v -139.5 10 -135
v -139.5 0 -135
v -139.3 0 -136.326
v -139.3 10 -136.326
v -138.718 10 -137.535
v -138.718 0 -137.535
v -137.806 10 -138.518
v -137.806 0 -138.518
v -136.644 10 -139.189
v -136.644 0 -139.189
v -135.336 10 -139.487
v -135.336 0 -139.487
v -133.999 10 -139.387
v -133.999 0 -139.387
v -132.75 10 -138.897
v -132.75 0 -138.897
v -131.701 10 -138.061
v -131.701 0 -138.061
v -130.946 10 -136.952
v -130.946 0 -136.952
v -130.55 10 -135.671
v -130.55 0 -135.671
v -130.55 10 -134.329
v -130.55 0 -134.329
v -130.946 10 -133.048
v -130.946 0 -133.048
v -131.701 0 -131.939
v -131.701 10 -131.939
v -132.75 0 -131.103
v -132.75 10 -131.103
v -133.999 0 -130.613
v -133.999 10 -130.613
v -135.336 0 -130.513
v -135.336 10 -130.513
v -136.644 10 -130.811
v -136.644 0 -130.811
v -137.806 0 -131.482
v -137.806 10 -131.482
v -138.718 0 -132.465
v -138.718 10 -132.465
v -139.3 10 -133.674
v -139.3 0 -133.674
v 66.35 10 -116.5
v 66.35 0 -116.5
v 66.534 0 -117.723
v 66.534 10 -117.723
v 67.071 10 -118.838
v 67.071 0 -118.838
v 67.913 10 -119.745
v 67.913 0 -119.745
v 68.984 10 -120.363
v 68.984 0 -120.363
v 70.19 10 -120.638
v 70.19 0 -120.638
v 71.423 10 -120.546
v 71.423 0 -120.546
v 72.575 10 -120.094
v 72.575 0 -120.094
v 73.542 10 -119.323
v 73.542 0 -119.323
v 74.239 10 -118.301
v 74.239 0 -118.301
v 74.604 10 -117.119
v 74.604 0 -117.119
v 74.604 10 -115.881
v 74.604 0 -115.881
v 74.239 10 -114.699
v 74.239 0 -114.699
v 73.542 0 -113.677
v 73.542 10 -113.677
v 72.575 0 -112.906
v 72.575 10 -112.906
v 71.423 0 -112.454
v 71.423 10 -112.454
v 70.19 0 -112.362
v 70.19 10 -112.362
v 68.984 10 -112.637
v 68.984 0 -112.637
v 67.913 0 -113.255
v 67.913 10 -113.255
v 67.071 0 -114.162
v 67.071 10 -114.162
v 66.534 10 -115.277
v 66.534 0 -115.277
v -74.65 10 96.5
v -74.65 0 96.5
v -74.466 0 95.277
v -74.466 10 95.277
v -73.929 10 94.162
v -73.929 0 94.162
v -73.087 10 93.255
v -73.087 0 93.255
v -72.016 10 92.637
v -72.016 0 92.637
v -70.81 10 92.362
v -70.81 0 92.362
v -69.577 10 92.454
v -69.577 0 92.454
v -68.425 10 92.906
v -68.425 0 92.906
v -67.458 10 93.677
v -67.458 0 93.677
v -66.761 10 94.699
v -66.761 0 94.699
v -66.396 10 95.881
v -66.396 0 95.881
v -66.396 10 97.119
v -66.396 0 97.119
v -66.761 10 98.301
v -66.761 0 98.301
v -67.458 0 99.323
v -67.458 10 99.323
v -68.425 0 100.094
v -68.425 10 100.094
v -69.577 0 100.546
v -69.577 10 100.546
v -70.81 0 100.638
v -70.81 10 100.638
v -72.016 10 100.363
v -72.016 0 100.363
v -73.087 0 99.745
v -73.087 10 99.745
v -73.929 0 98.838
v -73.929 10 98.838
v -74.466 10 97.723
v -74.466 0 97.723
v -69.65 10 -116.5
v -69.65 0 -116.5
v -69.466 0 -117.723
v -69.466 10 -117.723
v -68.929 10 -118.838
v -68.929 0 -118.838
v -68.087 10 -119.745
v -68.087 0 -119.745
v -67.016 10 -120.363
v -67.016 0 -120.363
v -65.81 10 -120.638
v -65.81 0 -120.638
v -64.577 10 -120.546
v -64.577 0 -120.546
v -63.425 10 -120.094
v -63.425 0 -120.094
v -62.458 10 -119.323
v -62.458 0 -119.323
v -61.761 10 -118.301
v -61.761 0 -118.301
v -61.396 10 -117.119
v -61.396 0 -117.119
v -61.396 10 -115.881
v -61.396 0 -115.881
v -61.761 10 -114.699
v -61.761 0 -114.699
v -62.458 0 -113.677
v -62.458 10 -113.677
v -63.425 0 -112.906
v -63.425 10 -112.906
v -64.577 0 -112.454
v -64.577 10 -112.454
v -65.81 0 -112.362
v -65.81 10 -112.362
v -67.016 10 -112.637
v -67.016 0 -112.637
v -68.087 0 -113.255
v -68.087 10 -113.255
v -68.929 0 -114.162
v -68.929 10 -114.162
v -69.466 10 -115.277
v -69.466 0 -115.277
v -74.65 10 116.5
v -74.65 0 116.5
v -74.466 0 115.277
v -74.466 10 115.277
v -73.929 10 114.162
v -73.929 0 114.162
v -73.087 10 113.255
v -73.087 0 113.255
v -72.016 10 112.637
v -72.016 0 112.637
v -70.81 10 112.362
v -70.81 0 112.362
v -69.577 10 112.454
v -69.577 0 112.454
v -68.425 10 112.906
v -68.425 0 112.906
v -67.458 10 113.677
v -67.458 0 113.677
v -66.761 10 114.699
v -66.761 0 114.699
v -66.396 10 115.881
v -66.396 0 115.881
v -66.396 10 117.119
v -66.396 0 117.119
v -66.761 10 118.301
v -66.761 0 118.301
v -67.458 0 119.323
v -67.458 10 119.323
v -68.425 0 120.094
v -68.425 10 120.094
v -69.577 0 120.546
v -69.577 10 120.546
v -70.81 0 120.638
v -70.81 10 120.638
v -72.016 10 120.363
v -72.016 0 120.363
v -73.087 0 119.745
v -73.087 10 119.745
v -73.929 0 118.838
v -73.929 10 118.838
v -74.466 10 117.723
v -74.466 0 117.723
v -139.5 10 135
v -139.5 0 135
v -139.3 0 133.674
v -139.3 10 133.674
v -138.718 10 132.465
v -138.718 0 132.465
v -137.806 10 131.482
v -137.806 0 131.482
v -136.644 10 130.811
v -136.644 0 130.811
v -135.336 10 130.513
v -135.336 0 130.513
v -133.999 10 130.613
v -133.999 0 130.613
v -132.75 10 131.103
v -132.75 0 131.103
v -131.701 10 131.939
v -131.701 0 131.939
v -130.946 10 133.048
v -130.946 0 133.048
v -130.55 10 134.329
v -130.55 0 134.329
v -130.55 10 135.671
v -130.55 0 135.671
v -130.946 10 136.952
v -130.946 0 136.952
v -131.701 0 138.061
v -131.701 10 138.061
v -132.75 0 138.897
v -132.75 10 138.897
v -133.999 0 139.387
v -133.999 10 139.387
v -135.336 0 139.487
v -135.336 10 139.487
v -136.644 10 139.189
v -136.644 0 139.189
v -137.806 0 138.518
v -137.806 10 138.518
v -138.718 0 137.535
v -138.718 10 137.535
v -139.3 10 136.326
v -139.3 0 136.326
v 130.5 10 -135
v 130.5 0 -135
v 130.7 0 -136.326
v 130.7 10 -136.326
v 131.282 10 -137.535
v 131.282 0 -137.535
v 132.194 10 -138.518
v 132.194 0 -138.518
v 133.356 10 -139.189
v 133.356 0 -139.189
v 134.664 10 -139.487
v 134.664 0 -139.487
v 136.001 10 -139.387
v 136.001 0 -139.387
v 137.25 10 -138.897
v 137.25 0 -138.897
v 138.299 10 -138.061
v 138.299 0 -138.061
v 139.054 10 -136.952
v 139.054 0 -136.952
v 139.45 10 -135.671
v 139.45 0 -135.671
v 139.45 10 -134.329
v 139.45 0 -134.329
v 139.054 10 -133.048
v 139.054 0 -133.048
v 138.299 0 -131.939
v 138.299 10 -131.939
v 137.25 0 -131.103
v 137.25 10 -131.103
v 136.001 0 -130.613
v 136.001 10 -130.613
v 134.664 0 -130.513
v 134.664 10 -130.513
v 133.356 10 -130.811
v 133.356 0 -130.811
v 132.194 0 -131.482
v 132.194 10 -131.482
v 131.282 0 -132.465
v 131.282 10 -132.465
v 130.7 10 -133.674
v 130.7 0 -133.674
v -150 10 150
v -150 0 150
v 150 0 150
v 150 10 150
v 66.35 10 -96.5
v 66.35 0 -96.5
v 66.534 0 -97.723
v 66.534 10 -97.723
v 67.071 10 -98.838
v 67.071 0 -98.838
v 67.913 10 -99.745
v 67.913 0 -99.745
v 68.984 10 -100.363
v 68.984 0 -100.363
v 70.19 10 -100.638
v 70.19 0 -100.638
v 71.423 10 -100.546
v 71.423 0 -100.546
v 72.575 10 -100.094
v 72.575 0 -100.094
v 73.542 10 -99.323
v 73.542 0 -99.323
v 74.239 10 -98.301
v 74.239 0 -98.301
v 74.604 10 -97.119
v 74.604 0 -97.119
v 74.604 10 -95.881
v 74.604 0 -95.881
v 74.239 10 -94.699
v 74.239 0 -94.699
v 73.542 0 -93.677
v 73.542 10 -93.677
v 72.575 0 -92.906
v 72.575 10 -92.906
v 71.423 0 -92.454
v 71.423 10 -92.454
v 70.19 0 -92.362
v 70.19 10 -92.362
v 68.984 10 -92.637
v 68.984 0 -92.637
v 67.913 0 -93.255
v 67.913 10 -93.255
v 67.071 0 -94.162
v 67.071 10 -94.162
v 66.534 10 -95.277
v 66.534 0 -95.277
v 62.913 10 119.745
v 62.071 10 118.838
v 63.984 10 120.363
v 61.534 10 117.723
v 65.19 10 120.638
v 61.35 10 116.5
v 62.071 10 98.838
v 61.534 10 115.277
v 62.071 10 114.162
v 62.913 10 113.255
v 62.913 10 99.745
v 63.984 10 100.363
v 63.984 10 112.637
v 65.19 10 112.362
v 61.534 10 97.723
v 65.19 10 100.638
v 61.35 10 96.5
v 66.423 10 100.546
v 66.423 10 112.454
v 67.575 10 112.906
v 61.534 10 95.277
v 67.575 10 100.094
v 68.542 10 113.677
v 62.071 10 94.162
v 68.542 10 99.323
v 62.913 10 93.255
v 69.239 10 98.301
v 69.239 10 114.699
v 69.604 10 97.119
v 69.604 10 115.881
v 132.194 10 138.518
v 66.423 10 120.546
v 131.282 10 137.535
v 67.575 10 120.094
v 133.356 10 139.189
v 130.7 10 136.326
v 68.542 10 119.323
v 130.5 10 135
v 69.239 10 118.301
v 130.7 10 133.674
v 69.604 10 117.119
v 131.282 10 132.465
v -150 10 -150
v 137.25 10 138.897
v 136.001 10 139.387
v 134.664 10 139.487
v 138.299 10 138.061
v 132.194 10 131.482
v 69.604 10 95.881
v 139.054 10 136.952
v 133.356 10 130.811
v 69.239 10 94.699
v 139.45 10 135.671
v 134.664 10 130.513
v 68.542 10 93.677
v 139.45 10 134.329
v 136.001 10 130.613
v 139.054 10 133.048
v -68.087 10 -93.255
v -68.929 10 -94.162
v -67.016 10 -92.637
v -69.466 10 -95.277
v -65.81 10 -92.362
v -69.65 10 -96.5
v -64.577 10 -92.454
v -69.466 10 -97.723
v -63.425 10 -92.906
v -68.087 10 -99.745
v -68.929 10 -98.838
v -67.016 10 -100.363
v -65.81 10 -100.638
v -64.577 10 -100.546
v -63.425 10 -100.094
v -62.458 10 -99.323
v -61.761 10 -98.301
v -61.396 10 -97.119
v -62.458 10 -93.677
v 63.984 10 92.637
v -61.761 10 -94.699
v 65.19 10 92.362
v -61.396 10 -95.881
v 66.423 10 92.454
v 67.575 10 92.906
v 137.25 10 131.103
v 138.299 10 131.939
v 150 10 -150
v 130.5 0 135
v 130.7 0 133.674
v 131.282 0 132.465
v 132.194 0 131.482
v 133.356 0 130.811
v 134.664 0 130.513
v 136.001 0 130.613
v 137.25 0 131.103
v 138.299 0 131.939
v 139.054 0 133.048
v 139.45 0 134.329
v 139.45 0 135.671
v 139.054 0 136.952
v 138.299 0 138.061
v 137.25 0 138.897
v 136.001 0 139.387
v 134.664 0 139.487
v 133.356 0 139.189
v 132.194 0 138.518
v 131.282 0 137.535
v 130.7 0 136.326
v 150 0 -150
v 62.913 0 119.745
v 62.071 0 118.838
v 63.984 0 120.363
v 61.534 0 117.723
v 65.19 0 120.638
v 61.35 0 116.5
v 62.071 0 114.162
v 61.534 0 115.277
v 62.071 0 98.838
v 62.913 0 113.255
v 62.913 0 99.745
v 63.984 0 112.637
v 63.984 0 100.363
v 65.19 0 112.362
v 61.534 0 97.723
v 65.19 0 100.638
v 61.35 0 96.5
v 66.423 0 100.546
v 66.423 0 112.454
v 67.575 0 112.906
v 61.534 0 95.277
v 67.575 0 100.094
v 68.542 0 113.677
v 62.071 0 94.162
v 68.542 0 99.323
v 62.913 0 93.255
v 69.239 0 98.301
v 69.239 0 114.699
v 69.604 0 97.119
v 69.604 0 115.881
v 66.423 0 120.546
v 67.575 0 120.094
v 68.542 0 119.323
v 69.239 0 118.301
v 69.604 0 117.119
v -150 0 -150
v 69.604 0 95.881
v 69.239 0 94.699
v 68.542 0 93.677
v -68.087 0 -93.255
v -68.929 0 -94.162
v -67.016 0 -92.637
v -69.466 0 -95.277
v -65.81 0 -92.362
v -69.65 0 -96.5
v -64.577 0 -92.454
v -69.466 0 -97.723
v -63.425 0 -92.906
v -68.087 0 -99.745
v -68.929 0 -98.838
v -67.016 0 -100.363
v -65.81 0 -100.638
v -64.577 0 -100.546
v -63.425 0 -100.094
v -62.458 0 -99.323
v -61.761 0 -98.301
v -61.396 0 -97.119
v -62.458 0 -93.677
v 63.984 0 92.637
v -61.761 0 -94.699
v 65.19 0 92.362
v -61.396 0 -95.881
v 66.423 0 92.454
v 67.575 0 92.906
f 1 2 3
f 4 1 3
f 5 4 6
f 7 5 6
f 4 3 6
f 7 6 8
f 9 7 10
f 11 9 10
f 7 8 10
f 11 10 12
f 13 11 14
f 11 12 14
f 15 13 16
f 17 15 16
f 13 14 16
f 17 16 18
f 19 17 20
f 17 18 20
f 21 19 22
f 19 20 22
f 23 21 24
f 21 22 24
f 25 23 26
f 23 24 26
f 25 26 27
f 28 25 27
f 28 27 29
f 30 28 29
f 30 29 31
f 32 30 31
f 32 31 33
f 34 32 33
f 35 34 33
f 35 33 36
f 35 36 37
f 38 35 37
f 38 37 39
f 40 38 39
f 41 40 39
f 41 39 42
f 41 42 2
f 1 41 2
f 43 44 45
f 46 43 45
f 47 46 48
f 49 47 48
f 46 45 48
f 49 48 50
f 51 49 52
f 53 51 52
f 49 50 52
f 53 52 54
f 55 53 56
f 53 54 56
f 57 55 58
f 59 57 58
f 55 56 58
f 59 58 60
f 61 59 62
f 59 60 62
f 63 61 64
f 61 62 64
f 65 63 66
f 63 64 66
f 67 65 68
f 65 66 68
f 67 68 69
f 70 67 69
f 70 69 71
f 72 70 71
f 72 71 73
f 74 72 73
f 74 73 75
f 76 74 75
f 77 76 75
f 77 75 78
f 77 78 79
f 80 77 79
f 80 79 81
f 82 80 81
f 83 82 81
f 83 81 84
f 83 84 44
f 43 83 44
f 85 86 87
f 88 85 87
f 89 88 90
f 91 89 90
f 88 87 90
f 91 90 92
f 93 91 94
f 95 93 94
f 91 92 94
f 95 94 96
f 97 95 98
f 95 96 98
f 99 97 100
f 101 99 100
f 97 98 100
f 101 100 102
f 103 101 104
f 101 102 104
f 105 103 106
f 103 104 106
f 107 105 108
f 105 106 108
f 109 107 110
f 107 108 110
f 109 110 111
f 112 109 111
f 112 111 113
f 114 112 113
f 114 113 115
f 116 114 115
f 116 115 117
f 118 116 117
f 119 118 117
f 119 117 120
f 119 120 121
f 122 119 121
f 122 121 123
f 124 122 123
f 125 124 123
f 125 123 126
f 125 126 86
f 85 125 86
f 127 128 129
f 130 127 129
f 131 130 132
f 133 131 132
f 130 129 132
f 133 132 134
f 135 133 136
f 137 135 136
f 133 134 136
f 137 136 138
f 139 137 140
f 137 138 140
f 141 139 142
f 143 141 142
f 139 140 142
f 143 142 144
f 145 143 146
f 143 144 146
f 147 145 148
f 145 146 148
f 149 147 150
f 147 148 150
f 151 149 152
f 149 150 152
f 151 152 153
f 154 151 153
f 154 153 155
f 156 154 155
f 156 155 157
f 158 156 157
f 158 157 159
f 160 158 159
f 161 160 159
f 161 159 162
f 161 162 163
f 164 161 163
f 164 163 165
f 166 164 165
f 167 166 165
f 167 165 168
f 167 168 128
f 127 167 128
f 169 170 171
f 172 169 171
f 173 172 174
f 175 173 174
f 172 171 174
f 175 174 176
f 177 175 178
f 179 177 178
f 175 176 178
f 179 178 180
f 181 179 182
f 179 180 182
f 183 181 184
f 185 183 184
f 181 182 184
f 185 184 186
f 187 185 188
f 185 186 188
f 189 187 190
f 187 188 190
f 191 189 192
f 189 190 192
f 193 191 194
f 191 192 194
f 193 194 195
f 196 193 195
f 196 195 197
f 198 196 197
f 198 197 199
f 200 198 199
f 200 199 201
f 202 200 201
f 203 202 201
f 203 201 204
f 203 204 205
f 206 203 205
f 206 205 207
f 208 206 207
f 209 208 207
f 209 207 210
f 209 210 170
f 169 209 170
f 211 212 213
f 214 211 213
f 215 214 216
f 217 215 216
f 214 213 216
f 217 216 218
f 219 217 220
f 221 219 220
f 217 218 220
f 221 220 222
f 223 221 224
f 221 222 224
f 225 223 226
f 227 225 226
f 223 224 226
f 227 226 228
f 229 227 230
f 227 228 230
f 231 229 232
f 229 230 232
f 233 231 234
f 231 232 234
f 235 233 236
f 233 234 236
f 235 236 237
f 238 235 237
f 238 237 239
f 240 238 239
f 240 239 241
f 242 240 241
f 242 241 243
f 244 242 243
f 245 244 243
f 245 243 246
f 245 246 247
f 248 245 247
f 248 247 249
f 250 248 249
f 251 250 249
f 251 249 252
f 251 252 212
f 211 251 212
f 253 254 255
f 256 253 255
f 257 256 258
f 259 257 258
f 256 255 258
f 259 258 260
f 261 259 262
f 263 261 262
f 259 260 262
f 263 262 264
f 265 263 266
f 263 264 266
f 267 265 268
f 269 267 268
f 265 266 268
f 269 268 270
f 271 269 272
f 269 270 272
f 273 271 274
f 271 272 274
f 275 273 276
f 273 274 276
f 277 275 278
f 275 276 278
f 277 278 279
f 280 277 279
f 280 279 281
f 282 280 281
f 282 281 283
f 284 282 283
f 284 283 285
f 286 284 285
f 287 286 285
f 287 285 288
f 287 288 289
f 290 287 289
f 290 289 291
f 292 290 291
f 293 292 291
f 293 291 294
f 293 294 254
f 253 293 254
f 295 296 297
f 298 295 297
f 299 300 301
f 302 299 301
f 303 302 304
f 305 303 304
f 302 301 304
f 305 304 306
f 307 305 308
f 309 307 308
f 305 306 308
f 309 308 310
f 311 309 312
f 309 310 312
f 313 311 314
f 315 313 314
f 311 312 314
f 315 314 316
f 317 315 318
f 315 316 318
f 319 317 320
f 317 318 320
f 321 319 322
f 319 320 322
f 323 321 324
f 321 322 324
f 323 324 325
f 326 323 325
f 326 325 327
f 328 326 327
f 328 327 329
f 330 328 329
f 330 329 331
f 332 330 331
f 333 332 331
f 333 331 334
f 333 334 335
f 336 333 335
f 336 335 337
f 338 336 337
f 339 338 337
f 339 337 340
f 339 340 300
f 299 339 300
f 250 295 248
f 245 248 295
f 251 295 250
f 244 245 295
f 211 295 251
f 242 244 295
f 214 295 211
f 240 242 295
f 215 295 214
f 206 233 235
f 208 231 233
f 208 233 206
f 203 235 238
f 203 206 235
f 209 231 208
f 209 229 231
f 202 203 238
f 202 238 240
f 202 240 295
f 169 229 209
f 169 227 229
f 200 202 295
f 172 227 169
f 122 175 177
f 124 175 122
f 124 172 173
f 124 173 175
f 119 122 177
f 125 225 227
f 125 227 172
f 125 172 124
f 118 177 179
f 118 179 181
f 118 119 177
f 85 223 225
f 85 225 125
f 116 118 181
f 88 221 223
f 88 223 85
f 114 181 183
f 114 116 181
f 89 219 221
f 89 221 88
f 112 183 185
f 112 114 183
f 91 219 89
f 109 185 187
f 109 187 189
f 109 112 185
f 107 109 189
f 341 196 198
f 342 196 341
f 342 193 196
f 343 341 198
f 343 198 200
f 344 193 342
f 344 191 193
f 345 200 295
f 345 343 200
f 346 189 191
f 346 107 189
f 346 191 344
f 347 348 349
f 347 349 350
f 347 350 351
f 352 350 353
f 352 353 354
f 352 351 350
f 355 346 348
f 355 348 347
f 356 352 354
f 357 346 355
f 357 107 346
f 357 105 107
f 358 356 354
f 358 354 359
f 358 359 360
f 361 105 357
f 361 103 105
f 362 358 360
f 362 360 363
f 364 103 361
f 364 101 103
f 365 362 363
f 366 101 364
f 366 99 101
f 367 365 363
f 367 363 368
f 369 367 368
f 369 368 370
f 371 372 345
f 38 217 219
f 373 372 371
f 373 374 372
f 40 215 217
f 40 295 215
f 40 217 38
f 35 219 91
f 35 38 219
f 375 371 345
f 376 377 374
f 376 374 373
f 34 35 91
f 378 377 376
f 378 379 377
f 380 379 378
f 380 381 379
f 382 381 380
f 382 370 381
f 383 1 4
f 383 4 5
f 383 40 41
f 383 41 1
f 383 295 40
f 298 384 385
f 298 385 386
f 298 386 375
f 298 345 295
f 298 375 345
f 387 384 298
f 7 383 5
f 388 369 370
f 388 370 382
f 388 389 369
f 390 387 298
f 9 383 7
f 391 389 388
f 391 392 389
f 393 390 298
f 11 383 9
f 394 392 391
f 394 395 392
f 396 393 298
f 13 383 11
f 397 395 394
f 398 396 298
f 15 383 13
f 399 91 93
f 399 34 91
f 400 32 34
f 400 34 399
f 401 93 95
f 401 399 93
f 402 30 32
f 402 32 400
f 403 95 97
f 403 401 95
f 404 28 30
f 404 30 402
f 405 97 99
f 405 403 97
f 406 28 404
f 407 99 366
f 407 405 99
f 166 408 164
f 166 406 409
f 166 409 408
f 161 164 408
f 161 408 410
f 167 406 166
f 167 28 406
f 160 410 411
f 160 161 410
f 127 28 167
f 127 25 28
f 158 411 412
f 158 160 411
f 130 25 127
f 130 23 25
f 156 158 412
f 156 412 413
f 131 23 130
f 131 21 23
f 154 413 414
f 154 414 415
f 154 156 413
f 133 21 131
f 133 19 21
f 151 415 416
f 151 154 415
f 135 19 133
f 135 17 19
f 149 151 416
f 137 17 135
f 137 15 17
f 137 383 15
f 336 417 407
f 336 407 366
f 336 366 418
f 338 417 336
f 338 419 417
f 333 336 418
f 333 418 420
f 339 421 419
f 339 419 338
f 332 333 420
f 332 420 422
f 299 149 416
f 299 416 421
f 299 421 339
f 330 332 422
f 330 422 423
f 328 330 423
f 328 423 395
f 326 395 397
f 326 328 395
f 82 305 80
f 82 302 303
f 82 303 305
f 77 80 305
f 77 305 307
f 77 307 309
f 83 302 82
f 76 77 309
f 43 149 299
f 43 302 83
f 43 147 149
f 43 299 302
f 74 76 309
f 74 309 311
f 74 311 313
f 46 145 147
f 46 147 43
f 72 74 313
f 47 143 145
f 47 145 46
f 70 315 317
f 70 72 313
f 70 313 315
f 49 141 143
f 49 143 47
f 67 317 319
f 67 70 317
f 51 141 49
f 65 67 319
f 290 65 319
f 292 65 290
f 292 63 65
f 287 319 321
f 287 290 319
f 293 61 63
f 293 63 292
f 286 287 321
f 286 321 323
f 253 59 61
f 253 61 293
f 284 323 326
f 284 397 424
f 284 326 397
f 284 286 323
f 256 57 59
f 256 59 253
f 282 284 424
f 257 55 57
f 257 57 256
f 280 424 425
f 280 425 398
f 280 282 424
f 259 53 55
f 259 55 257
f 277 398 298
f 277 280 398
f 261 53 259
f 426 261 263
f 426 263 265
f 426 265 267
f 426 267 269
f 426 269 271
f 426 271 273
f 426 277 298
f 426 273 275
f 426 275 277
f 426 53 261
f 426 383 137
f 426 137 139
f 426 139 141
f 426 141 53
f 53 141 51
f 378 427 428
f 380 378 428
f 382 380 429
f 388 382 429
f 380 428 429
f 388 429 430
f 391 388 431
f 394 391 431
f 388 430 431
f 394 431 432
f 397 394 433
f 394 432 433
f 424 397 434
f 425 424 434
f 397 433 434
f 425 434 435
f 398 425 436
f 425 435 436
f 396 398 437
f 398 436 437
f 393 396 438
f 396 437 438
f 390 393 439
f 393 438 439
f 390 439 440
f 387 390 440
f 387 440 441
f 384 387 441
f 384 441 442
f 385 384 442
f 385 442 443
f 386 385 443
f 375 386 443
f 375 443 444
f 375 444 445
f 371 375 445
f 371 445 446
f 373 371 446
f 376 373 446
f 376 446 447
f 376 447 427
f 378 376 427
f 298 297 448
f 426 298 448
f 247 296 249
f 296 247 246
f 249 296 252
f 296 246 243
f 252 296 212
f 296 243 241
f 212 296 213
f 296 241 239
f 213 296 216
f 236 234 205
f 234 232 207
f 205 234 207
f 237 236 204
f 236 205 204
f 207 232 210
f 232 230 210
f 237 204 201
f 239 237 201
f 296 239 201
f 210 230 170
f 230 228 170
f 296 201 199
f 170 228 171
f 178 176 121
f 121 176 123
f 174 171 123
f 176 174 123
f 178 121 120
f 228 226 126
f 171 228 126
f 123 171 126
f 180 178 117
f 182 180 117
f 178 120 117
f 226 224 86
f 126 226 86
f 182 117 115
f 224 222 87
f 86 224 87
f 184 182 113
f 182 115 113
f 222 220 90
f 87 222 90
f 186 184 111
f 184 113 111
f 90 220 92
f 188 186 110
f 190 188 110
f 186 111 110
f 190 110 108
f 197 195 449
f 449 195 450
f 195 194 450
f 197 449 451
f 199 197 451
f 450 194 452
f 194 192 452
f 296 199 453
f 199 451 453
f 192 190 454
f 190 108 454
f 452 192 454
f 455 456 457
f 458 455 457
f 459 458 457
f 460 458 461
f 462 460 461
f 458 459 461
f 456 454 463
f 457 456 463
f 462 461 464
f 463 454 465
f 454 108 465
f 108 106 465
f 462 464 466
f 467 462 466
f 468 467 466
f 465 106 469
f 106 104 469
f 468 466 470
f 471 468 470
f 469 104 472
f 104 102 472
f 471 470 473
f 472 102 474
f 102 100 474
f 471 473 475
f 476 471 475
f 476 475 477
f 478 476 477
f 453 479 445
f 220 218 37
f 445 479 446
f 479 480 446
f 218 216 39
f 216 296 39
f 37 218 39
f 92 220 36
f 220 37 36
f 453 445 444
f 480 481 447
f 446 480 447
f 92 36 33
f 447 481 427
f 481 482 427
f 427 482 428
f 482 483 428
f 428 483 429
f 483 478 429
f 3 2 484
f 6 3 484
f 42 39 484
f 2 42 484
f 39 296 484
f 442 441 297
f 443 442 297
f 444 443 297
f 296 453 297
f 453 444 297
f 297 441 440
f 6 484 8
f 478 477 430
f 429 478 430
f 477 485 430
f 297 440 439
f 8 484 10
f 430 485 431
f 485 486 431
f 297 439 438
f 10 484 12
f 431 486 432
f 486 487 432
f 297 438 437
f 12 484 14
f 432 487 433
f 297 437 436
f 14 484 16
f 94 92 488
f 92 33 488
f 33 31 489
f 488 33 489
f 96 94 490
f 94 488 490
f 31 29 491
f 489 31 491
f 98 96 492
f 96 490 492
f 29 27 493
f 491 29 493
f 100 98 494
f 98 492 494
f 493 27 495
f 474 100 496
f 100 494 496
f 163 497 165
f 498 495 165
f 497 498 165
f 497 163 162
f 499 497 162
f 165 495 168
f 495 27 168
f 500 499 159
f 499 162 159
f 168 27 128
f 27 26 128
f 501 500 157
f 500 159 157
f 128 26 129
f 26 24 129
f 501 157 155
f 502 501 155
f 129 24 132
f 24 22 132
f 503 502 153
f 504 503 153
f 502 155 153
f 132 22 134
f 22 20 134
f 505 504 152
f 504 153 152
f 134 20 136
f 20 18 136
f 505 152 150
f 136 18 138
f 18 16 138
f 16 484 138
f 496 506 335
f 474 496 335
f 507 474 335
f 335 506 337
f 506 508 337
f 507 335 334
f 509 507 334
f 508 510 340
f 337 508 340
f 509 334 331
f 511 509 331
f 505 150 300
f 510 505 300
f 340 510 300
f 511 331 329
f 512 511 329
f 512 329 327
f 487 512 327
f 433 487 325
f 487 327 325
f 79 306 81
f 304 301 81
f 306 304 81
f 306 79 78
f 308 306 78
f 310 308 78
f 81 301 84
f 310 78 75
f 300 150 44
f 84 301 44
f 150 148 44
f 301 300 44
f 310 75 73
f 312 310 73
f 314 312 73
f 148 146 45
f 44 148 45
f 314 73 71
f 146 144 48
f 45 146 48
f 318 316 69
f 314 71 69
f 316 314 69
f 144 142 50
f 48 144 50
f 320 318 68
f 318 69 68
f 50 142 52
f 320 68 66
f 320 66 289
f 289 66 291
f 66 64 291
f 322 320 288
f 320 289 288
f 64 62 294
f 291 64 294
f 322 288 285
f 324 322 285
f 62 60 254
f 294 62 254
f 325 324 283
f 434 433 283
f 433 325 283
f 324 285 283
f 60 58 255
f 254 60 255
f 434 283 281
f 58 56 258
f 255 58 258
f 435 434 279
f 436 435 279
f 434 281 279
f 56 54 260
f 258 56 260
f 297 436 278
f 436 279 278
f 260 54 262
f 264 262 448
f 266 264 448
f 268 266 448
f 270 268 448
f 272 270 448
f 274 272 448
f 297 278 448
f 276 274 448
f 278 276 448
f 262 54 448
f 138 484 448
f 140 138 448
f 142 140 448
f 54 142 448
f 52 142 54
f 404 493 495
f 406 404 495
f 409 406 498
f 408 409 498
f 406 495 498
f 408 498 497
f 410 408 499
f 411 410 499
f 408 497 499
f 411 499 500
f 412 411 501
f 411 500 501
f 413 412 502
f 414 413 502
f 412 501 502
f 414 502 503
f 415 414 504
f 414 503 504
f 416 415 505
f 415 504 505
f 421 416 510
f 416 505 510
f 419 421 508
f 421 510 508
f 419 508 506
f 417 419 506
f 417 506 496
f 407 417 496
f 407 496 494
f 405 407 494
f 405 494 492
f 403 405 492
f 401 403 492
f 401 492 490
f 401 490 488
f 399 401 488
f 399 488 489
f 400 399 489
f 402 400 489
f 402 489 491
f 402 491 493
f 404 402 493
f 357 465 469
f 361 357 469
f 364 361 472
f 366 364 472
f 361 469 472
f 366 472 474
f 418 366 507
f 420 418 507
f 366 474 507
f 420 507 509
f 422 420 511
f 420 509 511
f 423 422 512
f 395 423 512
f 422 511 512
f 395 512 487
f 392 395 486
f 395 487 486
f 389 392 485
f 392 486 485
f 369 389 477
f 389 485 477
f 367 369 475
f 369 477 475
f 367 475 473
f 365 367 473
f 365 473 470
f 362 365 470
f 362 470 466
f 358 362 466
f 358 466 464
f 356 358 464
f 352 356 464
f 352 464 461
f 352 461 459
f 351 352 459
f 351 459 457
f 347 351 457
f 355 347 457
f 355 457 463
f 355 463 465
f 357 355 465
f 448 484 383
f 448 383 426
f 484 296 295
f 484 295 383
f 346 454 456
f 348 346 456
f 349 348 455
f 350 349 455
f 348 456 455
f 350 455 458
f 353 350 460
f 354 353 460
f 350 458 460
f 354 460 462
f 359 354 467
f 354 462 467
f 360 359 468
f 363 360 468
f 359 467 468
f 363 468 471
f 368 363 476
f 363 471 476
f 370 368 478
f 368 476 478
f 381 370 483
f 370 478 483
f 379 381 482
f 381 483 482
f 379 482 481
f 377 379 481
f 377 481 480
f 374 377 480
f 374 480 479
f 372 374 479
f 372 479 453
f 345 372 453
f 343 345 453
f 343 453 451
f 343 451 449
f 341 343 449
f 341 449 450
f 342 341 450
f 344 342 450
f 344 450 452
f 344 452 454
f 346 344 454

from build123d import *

# Parameters (mm, degrees)
SKETCH1_W                           = 300
SKETCH1_H                           = 300
BOSS_EXTRUDE1_DEPTH                 = 10
TAPPED_HOLE_FOR_M8X1_25_HELICOIL1_D = 8.3
M8_CLEARANCE_HOLE2_D                = 9


with BuildPart() as part:
    # Sketch1 → Boss-Extrude1 (new body)
    with BuildSketch(Plane(origin=(0, 0, 0), x_dir=(1, 0, 0), z_dir=(0, 1, 0))):
        Rectangle(SKETCH1_W, SKETCH1_H)
    extrude(amount=BOSS_EXTRUDE1_DEPTH)

    # Tapped Hole for M8x1.25 Helicoil1 (through all)
    with Locations(Plane(origin=(0, 10, 0), x_dir=(1, 0, 0), z_dir=(0, 1, 0))):
        with Locations((70.5, 116.5), (70.5, 96.5), (65.5, -96.5), (65.5, -116.5), (-65.5, 116.5), (-65.5, 96.5), (-70.5, -96.5), (-70.5, -116.5)):
            Hole(TAPPED_HOLE_FOR_M8X1_25_HELICOIL1_D / 2)

    # M8 Clearance Hole2 (through all)
    with Locations(Plane(origin=(0, 10, 0), x_dir=(1, 0, 0), z_dir=(0, 1, 0))):
        with Locations((-135, -135), (-135, 135), (135, 135), (135, -135)):
            Hole(M8_CLEARANCE_HOLE2_D / 2)


solid = part.part
